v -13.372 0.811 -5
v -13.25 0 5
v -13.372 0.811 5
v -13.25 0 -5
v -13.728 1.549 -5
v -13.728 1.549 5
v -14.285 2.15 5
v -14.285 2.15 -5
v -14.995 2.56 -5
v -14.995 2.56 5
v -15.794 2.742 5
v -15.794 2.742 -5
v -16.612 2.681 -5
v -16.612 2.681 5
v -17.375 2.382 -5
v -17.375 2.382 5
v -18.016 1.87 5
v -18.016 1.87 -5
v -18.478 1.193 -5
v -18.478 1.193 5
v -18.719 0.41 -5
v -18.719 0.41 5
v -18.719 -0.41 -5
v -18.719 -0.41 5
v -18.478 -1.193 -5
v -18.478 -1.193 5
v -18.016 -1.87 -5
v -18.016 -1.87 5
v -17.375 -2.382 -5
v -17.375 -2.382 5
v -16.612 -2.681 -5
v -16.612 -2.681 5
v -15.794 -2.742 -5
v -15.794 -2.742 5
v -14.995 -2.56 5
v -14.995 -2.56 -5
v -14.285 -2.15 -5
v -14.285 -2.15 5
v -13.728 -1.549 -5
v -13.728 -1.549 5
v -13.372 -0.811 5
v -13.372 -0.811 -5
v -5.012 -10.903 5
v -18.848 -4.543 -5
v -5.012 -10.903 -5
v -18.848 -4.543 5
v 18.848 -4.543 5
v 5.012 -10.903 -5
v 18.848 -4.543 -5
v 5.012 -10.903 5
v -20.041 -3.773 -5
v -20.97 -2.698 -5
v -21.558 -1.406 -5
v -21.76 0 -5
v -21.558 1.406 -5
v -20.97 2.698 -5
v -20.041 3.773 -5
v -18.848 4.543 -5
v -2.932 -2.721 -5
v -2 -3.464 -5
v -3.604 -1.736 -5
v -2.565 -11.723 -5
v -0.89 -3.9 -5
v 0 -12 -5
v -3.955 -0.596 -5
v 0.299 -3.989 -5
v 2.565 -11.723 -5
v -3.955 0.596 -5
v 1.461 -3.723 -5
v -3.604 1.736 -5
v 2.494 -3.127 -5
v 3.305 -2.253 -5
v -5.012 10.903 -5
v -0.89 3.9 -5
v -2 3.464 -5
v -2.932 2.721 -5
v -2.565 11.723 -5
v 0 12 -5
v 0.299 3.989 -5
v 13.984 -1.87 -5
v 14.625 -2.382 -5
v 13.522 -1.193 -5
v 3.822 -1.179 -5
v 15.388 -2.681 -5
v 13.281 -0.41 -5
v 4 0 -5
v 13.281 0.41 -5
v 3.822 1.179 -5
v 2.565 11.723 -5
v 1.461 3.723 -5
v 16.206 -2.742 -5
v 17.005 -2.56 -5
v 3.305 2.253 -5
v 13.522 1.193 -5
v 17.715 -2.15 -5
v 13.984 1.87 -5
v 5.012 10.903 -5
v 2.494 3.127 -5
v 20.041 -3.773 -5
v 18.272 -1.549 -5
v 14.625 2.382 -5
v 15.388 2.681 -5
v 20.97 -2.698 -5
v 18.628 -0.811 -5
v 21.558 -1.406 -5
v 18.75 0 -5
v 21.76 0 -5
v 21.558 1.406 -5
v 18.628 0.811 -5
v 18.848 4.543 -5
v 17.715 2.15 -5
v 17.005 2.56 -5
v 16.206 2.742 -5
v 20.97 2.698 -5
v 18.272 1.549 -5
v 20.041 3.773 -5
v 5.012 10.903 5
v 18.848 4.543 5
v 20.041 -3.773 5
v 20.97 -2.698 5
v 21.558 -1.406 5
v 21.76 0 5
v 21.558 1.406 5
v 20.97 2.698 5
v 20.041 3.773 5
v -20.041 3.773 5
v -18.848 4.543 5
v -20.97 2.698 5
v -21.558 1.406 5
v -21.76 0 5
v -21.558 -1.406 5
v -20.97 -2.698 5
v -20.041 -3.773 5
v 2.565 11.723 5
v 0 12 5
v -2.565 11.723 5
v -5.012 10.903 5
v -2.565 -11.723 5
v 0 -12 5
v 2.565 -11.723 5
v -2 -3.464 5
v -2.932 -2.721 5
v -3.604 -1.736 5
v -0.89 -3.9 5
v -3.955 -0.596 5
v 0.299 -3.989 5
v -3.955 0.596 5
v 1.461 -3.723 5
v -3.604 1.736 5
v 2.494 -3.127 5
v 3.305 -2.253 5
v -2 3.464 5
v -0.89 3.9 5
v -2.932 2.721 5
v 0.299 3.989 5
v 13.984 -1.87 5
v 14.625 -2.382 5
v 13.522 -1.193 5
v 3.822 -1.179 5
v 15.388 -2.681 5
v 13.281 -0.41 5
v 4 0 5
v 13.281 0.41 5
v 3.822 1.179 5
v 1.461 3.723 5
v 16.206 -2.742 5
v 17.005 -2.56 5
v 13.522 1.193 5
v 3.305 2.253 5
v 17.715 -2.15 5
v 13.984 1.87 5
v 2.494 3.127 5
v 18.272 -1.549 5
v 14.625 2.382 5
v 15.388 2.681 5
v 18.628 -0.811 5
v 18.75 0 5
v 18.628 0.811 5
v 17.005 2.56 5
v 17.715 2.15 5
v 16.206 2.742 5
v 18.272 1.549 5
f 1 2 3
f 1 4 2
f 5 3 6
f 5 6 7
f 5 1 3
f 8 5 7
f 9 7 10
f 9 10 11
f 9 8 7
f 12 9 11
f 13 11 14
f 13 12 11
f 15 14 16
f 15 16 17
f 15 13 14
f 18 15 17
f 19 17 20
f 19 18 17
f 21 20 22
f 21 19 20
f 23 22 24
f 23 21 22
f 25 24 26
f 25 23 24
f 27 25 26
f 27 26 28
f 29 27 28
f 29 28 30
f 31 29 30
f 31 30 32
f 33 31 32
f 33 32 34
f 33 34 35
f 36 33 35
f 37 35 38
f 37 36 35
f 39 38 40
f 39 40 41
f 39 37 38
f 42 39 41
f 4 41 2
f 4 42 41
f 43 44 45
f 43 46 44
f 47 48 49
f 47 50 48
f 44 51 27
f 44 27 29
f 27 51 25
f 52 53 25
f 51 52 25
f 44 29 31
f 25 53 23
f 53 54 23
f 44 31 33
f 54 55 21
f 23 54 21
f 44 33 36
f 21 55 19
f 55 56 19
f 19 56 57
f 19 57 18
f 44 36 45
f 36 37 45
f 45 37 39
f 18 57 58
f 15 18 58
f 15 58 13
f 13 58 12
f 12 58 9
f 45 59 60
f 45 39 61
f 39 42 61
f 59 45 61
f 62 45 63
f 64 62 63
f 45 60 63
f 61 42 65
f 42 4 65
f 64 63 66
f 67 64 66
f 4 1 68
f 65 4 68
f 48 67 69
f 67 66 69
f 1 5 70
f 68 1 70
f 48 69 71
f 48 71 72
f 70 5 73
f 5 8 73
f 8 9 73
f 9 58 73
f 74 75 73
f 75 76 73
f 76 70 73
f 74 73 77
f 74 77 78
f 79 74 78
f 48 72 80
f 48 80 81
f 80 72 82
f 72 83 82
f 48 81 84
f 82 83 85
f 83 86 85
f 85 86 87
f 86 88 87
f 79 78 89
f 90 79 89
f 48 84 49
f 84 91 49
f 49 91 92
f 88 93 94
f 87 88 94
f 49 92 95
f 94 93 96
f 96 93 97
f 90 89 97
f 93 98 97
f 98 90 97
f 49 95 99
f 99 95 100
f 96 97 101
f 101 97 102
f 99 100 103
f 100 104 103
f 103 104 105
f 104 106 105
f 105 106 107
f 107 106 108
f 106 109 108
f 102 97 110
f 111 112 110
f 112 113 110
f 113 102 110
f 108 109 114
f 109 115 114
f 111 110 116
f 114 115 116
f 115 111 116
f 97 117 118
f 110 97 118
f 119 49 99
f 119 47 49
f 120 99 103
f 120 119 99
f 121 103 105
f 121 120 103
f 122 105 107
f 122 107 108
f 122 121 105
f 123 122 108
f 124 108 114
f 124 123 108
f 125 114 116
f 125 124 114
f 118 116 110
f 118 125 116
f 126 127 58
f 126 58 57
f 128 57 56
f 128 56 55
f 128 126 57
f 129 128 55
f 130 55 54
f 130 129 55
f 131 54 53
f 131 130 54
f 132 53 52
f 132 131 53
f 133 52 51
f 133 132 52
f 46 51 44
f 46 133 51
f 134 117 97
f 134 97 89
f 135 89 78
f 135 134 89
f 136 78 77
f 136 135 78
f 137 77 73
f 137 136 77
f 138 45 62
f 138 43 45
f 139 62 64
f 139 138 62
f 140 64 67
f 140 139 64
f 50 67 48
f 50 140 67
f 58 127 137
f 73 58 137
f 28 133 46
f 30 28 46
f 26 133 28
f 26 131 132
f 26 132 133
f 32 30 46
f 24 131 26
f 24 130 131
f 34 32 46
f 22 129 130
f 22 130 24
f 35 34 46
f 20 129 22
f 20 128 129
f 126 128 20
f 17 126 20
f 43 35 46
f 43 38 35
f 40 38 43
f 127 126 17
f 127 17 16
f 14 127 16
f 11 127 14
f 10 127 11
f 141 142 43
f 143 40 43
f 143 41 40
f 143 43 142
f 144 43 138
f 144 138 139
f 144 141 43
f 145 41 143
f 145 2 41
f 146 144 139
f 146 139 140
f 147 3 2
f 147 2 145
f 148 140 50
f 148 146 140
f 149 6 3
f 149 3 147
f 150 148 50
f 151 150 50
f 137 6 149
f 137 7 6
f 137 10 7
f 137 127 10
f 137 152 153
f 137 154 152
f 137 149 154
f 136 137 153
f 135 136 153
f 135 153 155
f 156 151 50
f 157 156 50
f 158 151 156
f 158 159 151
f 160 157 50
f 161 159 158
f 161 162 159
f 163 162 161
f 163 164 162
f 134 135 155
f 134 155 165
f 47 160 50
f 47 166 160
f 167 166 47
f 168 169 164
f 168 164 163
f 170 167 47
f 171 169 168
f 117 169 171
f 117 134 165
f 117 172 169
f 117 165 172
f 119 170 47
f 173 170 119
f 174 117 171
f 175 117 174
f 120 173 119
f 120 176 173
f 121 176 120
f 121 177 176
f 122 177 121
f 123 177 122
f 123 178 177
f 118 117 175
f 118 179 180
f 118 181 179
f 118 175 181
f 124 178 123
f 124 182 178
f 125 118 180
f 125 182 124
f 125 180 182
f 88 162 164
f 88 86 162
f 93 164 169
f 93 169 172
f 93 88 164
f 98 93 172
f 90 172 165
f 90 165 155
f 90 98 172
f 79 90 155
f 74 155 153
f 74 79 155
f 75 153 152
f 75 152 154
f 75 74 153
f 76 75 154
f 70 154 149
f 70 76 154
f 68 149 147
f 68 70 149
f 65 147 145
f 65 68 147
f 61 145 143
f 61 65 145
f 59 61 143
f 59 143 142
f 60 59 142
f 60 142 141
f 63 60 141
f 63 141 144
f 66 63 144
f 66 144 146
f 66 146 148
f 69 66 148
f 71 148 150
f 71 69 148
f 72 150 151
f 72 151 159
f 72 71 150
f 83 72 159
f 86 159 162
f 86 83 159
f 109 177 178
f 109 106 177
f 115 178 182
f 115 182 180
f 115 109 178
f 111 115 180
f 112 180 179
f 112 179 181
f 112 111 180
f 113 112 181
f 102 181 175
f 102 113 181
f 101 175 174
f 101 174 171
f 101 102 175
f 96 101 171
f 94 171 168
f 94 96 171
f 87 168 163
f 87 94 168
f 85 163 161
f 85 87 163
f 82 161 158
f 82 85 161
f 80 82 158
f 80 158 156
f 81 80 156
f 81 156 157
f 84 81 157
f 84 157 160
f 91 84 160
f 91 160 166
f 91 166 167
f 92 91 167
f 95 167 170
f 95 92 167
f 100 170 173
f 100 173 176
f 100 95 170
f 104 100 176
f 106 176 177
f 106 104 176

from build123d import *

# Parameters (mm, degrees)
SKETCH_R   = 4
SKETCH_R_2 = 2.75
PAD_DEPTH  = 5


with BuildPart() as part:
    # Sketch → Pad (new body, symmetric)
    with BuildSketch(Plane.XY):
        with BuildLine():
            ThreePointArc((18.848305, -4.543015), (21.76, 0), (18.848305, 4.543014))
            Line((5.011933, 10.903235), (18.848305, 4.543014))
            ThreePointArc((5.011933, 10.903235), (0, 12), (-5.011933, 10.903235))
            Line((-18.848305, 4.543014), (-5.011933, 10.903235))
            ThreePointArc((-18.848305, 4.543014), (-21.76, 1.3e-05), (-18.848328, -4.543004))
            Line((-18.848328, -4.543004), (-5.011941, -10.903231))
            ThreePointArc((-5.011941, -10.903231), (-1.2e-05, -12), (5.01192, -10.903241))
            Line((5.01192, -10.903241), (18.848305, -4.543015))
        make_face()
        Circle(SKETCH_R, mode=Mode.SUBTRACT)
        with Locations((-16, 0)):
            Circle(SKETCH_R_2, mode=Mode.SUBTRACT)
        with Locations((16, 0)):
            Circle(SKETCH_R_2, mode=Mode.SUBTRACT)
    extrude(amount=PAD_DEPTH, both=True)


solid = part.part
